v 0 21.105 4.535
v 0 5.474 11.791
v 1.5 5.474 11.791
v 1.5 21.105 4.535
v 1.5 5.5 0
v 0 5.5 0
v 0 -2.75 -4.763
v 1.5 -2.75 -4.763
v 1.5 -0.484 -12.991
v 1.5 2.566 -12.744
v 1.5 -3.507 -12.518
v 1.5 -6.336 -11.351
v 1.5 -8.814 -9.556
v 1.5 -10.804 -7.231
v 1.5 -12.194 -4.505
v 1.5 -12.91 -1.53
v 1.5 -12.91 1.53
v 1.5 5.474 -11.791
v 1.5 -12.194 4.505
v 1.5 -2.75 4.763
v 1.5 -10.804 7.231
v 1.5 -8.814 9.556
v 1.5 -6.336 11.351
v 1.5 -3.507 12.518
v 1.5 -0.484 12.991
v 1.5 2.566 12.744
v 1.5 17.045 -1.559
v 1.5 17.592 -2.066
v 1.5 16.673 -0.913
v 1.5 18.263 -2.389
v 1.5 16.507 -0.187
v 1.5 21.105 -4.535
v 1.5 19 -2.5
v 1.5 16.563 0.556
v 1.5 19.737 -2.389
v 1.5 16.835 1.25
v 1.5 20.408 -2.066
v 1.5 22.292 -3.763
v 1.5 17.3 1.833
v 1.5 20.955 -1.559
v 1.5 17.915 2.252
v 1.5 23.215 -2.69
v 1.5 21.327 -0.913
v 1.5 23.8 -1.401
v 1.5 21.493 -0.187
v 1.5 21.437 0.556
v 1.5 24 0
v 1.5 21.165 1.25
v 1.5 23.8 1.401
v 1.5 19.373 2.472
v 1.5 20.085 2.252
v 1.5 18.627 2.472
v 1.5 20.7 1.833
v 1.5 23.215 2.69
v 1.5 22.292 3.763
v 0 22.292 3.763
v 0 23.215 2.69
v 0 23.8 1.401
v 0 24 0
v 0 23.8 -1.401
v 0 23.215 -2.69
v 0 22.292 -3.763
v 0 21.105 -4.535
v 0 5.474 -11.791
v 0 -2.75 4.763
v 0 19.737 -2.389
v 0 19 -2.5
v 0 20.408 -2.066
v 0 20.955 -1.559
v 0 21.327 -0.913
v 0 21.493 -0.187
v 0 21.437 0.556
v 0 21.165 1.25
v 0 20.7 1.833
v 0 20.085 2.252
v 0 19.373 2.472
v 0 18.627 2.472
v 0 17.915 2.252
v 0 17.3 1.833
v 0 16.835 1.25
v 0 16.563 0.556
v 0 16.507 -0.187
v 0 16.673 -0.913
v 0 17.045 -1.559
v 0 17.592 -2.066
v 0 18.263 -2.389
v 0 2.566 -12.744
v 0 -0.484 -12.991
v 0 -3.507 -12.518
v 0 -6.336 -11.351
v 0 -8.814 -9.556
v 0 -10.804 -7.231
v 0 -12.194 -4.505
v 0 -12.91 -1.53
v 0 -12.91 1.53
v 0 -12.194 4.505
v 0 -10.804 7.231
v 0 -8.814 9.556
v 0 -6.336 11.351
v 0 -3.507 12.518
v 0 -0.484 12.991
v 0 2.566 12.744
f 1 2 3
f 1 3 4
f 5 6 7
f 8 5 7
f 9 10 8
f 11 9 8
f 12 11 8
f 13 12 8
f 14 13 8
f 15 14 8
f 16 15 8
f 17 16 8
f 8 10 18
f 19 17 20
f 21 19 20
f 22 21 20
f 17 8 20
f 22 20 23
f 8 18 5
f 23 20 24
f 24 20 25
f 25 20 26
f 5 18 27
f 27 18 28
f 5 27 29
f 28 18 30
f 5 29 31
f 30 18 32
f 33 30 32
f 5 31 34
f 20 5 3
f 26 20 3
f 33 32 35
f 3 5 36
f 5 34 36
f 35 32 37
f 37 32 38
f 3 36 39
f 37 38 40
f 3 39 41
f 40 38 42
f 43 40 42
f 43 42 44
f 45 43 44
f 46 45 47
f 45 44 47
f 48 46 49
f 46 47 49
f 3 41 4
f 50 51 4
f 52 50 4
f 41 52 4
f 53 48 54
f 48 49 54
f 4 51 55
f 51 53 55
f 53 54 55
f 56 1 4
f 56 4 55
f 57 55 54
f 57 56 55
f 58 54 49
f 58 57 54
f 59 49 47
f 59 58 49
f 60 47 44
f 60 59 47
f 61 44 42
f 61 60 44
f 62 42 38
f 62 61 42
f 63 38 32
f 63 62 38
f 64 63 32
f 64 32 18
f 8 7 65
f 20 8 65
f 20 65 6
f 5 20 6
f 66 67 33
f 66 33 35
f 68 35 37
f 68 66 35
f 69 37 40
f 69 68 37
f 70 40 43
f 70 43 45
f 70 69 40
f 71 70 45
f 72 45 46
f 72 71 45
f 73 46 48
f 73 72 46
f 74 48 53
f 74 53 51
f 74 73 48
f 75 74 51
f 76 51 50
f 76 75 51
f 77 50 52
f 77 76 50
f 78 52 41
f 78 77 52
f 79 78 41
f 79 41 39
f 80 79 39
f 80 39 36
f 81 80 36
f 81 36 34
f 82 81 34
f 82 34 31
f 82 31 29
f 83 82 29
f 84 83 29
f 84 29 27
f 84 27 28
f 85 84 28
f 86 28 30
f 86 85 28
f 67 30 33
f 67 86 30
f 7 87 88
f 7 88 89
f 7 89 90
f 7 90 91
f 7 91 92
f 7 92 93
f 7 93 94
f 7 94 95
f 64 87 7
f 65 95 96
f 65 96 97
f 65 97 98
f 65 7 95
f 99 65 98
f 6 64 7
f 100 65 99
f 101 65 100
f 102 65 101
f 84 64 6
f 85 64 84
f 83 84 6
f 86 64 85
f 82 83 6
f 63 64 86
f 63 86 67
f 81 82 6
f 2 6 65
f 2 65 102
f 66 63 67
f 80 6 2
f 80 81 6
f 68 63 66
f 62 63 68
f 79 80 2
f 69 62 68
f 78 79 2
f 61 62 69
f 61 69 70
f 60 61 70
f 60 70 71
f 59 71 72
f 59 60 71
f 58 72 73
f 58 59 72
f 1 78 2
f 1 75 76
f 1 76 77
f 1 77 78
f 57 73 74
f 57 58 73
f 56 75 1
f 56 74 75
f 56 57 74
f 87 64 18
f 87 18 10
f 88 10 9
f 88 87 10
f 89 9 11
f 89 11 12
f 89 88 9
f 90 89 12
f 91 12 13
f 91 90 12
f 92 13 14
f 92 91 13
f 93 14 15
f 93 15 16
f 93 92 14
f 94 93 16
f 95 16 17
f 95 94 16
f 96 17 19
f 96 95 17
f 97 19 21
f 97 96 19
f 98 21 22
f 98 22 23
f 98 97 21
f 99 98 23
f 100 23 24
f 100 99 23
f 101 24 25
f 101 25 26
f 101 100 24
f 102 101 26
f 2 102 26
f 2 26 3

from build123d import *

# Parameters (mm, degrees)
SKETCH1_R           = 2.5
BOSS_EXTRUDE1_DEPTH = 1.5


with BuildPart() as part:
    # Sketch1 → Boss-Extrude1 (new body)
    with BuildSketch(Plane(origin=(0, 0, 0), x_dir=(0, 0, -1), z_dir=(1, 0, 0))):
        with BuildLine():
            Line((-11.791470696, 5.473684211), (-4.535181037, 21.105263158))
            ThreePointArc((-4.535181037, 21.105263158), (0, 24), (4.535181037, 21.105263158))
            Line((4.535181037, 21.105263158), (11.791470696, 5.473684211))
            ThreePointArc((11.791470696, 5.473684211), (0, -13), (-11.791470696, 5.473684211))
        make_face()
        with Locations((0, 19)):
            Circle(SKETCH1_R, mode=Mode.SUBTRACT)
        Polygon((4.763139721, -2.75), (-4.763139721, -2.75), (0, 5.5), align=None, mode=Mode.SUBTRACT)
    extrude(amount=BOSS_EXTRUDE1_DEPTH)


solid = part.part
